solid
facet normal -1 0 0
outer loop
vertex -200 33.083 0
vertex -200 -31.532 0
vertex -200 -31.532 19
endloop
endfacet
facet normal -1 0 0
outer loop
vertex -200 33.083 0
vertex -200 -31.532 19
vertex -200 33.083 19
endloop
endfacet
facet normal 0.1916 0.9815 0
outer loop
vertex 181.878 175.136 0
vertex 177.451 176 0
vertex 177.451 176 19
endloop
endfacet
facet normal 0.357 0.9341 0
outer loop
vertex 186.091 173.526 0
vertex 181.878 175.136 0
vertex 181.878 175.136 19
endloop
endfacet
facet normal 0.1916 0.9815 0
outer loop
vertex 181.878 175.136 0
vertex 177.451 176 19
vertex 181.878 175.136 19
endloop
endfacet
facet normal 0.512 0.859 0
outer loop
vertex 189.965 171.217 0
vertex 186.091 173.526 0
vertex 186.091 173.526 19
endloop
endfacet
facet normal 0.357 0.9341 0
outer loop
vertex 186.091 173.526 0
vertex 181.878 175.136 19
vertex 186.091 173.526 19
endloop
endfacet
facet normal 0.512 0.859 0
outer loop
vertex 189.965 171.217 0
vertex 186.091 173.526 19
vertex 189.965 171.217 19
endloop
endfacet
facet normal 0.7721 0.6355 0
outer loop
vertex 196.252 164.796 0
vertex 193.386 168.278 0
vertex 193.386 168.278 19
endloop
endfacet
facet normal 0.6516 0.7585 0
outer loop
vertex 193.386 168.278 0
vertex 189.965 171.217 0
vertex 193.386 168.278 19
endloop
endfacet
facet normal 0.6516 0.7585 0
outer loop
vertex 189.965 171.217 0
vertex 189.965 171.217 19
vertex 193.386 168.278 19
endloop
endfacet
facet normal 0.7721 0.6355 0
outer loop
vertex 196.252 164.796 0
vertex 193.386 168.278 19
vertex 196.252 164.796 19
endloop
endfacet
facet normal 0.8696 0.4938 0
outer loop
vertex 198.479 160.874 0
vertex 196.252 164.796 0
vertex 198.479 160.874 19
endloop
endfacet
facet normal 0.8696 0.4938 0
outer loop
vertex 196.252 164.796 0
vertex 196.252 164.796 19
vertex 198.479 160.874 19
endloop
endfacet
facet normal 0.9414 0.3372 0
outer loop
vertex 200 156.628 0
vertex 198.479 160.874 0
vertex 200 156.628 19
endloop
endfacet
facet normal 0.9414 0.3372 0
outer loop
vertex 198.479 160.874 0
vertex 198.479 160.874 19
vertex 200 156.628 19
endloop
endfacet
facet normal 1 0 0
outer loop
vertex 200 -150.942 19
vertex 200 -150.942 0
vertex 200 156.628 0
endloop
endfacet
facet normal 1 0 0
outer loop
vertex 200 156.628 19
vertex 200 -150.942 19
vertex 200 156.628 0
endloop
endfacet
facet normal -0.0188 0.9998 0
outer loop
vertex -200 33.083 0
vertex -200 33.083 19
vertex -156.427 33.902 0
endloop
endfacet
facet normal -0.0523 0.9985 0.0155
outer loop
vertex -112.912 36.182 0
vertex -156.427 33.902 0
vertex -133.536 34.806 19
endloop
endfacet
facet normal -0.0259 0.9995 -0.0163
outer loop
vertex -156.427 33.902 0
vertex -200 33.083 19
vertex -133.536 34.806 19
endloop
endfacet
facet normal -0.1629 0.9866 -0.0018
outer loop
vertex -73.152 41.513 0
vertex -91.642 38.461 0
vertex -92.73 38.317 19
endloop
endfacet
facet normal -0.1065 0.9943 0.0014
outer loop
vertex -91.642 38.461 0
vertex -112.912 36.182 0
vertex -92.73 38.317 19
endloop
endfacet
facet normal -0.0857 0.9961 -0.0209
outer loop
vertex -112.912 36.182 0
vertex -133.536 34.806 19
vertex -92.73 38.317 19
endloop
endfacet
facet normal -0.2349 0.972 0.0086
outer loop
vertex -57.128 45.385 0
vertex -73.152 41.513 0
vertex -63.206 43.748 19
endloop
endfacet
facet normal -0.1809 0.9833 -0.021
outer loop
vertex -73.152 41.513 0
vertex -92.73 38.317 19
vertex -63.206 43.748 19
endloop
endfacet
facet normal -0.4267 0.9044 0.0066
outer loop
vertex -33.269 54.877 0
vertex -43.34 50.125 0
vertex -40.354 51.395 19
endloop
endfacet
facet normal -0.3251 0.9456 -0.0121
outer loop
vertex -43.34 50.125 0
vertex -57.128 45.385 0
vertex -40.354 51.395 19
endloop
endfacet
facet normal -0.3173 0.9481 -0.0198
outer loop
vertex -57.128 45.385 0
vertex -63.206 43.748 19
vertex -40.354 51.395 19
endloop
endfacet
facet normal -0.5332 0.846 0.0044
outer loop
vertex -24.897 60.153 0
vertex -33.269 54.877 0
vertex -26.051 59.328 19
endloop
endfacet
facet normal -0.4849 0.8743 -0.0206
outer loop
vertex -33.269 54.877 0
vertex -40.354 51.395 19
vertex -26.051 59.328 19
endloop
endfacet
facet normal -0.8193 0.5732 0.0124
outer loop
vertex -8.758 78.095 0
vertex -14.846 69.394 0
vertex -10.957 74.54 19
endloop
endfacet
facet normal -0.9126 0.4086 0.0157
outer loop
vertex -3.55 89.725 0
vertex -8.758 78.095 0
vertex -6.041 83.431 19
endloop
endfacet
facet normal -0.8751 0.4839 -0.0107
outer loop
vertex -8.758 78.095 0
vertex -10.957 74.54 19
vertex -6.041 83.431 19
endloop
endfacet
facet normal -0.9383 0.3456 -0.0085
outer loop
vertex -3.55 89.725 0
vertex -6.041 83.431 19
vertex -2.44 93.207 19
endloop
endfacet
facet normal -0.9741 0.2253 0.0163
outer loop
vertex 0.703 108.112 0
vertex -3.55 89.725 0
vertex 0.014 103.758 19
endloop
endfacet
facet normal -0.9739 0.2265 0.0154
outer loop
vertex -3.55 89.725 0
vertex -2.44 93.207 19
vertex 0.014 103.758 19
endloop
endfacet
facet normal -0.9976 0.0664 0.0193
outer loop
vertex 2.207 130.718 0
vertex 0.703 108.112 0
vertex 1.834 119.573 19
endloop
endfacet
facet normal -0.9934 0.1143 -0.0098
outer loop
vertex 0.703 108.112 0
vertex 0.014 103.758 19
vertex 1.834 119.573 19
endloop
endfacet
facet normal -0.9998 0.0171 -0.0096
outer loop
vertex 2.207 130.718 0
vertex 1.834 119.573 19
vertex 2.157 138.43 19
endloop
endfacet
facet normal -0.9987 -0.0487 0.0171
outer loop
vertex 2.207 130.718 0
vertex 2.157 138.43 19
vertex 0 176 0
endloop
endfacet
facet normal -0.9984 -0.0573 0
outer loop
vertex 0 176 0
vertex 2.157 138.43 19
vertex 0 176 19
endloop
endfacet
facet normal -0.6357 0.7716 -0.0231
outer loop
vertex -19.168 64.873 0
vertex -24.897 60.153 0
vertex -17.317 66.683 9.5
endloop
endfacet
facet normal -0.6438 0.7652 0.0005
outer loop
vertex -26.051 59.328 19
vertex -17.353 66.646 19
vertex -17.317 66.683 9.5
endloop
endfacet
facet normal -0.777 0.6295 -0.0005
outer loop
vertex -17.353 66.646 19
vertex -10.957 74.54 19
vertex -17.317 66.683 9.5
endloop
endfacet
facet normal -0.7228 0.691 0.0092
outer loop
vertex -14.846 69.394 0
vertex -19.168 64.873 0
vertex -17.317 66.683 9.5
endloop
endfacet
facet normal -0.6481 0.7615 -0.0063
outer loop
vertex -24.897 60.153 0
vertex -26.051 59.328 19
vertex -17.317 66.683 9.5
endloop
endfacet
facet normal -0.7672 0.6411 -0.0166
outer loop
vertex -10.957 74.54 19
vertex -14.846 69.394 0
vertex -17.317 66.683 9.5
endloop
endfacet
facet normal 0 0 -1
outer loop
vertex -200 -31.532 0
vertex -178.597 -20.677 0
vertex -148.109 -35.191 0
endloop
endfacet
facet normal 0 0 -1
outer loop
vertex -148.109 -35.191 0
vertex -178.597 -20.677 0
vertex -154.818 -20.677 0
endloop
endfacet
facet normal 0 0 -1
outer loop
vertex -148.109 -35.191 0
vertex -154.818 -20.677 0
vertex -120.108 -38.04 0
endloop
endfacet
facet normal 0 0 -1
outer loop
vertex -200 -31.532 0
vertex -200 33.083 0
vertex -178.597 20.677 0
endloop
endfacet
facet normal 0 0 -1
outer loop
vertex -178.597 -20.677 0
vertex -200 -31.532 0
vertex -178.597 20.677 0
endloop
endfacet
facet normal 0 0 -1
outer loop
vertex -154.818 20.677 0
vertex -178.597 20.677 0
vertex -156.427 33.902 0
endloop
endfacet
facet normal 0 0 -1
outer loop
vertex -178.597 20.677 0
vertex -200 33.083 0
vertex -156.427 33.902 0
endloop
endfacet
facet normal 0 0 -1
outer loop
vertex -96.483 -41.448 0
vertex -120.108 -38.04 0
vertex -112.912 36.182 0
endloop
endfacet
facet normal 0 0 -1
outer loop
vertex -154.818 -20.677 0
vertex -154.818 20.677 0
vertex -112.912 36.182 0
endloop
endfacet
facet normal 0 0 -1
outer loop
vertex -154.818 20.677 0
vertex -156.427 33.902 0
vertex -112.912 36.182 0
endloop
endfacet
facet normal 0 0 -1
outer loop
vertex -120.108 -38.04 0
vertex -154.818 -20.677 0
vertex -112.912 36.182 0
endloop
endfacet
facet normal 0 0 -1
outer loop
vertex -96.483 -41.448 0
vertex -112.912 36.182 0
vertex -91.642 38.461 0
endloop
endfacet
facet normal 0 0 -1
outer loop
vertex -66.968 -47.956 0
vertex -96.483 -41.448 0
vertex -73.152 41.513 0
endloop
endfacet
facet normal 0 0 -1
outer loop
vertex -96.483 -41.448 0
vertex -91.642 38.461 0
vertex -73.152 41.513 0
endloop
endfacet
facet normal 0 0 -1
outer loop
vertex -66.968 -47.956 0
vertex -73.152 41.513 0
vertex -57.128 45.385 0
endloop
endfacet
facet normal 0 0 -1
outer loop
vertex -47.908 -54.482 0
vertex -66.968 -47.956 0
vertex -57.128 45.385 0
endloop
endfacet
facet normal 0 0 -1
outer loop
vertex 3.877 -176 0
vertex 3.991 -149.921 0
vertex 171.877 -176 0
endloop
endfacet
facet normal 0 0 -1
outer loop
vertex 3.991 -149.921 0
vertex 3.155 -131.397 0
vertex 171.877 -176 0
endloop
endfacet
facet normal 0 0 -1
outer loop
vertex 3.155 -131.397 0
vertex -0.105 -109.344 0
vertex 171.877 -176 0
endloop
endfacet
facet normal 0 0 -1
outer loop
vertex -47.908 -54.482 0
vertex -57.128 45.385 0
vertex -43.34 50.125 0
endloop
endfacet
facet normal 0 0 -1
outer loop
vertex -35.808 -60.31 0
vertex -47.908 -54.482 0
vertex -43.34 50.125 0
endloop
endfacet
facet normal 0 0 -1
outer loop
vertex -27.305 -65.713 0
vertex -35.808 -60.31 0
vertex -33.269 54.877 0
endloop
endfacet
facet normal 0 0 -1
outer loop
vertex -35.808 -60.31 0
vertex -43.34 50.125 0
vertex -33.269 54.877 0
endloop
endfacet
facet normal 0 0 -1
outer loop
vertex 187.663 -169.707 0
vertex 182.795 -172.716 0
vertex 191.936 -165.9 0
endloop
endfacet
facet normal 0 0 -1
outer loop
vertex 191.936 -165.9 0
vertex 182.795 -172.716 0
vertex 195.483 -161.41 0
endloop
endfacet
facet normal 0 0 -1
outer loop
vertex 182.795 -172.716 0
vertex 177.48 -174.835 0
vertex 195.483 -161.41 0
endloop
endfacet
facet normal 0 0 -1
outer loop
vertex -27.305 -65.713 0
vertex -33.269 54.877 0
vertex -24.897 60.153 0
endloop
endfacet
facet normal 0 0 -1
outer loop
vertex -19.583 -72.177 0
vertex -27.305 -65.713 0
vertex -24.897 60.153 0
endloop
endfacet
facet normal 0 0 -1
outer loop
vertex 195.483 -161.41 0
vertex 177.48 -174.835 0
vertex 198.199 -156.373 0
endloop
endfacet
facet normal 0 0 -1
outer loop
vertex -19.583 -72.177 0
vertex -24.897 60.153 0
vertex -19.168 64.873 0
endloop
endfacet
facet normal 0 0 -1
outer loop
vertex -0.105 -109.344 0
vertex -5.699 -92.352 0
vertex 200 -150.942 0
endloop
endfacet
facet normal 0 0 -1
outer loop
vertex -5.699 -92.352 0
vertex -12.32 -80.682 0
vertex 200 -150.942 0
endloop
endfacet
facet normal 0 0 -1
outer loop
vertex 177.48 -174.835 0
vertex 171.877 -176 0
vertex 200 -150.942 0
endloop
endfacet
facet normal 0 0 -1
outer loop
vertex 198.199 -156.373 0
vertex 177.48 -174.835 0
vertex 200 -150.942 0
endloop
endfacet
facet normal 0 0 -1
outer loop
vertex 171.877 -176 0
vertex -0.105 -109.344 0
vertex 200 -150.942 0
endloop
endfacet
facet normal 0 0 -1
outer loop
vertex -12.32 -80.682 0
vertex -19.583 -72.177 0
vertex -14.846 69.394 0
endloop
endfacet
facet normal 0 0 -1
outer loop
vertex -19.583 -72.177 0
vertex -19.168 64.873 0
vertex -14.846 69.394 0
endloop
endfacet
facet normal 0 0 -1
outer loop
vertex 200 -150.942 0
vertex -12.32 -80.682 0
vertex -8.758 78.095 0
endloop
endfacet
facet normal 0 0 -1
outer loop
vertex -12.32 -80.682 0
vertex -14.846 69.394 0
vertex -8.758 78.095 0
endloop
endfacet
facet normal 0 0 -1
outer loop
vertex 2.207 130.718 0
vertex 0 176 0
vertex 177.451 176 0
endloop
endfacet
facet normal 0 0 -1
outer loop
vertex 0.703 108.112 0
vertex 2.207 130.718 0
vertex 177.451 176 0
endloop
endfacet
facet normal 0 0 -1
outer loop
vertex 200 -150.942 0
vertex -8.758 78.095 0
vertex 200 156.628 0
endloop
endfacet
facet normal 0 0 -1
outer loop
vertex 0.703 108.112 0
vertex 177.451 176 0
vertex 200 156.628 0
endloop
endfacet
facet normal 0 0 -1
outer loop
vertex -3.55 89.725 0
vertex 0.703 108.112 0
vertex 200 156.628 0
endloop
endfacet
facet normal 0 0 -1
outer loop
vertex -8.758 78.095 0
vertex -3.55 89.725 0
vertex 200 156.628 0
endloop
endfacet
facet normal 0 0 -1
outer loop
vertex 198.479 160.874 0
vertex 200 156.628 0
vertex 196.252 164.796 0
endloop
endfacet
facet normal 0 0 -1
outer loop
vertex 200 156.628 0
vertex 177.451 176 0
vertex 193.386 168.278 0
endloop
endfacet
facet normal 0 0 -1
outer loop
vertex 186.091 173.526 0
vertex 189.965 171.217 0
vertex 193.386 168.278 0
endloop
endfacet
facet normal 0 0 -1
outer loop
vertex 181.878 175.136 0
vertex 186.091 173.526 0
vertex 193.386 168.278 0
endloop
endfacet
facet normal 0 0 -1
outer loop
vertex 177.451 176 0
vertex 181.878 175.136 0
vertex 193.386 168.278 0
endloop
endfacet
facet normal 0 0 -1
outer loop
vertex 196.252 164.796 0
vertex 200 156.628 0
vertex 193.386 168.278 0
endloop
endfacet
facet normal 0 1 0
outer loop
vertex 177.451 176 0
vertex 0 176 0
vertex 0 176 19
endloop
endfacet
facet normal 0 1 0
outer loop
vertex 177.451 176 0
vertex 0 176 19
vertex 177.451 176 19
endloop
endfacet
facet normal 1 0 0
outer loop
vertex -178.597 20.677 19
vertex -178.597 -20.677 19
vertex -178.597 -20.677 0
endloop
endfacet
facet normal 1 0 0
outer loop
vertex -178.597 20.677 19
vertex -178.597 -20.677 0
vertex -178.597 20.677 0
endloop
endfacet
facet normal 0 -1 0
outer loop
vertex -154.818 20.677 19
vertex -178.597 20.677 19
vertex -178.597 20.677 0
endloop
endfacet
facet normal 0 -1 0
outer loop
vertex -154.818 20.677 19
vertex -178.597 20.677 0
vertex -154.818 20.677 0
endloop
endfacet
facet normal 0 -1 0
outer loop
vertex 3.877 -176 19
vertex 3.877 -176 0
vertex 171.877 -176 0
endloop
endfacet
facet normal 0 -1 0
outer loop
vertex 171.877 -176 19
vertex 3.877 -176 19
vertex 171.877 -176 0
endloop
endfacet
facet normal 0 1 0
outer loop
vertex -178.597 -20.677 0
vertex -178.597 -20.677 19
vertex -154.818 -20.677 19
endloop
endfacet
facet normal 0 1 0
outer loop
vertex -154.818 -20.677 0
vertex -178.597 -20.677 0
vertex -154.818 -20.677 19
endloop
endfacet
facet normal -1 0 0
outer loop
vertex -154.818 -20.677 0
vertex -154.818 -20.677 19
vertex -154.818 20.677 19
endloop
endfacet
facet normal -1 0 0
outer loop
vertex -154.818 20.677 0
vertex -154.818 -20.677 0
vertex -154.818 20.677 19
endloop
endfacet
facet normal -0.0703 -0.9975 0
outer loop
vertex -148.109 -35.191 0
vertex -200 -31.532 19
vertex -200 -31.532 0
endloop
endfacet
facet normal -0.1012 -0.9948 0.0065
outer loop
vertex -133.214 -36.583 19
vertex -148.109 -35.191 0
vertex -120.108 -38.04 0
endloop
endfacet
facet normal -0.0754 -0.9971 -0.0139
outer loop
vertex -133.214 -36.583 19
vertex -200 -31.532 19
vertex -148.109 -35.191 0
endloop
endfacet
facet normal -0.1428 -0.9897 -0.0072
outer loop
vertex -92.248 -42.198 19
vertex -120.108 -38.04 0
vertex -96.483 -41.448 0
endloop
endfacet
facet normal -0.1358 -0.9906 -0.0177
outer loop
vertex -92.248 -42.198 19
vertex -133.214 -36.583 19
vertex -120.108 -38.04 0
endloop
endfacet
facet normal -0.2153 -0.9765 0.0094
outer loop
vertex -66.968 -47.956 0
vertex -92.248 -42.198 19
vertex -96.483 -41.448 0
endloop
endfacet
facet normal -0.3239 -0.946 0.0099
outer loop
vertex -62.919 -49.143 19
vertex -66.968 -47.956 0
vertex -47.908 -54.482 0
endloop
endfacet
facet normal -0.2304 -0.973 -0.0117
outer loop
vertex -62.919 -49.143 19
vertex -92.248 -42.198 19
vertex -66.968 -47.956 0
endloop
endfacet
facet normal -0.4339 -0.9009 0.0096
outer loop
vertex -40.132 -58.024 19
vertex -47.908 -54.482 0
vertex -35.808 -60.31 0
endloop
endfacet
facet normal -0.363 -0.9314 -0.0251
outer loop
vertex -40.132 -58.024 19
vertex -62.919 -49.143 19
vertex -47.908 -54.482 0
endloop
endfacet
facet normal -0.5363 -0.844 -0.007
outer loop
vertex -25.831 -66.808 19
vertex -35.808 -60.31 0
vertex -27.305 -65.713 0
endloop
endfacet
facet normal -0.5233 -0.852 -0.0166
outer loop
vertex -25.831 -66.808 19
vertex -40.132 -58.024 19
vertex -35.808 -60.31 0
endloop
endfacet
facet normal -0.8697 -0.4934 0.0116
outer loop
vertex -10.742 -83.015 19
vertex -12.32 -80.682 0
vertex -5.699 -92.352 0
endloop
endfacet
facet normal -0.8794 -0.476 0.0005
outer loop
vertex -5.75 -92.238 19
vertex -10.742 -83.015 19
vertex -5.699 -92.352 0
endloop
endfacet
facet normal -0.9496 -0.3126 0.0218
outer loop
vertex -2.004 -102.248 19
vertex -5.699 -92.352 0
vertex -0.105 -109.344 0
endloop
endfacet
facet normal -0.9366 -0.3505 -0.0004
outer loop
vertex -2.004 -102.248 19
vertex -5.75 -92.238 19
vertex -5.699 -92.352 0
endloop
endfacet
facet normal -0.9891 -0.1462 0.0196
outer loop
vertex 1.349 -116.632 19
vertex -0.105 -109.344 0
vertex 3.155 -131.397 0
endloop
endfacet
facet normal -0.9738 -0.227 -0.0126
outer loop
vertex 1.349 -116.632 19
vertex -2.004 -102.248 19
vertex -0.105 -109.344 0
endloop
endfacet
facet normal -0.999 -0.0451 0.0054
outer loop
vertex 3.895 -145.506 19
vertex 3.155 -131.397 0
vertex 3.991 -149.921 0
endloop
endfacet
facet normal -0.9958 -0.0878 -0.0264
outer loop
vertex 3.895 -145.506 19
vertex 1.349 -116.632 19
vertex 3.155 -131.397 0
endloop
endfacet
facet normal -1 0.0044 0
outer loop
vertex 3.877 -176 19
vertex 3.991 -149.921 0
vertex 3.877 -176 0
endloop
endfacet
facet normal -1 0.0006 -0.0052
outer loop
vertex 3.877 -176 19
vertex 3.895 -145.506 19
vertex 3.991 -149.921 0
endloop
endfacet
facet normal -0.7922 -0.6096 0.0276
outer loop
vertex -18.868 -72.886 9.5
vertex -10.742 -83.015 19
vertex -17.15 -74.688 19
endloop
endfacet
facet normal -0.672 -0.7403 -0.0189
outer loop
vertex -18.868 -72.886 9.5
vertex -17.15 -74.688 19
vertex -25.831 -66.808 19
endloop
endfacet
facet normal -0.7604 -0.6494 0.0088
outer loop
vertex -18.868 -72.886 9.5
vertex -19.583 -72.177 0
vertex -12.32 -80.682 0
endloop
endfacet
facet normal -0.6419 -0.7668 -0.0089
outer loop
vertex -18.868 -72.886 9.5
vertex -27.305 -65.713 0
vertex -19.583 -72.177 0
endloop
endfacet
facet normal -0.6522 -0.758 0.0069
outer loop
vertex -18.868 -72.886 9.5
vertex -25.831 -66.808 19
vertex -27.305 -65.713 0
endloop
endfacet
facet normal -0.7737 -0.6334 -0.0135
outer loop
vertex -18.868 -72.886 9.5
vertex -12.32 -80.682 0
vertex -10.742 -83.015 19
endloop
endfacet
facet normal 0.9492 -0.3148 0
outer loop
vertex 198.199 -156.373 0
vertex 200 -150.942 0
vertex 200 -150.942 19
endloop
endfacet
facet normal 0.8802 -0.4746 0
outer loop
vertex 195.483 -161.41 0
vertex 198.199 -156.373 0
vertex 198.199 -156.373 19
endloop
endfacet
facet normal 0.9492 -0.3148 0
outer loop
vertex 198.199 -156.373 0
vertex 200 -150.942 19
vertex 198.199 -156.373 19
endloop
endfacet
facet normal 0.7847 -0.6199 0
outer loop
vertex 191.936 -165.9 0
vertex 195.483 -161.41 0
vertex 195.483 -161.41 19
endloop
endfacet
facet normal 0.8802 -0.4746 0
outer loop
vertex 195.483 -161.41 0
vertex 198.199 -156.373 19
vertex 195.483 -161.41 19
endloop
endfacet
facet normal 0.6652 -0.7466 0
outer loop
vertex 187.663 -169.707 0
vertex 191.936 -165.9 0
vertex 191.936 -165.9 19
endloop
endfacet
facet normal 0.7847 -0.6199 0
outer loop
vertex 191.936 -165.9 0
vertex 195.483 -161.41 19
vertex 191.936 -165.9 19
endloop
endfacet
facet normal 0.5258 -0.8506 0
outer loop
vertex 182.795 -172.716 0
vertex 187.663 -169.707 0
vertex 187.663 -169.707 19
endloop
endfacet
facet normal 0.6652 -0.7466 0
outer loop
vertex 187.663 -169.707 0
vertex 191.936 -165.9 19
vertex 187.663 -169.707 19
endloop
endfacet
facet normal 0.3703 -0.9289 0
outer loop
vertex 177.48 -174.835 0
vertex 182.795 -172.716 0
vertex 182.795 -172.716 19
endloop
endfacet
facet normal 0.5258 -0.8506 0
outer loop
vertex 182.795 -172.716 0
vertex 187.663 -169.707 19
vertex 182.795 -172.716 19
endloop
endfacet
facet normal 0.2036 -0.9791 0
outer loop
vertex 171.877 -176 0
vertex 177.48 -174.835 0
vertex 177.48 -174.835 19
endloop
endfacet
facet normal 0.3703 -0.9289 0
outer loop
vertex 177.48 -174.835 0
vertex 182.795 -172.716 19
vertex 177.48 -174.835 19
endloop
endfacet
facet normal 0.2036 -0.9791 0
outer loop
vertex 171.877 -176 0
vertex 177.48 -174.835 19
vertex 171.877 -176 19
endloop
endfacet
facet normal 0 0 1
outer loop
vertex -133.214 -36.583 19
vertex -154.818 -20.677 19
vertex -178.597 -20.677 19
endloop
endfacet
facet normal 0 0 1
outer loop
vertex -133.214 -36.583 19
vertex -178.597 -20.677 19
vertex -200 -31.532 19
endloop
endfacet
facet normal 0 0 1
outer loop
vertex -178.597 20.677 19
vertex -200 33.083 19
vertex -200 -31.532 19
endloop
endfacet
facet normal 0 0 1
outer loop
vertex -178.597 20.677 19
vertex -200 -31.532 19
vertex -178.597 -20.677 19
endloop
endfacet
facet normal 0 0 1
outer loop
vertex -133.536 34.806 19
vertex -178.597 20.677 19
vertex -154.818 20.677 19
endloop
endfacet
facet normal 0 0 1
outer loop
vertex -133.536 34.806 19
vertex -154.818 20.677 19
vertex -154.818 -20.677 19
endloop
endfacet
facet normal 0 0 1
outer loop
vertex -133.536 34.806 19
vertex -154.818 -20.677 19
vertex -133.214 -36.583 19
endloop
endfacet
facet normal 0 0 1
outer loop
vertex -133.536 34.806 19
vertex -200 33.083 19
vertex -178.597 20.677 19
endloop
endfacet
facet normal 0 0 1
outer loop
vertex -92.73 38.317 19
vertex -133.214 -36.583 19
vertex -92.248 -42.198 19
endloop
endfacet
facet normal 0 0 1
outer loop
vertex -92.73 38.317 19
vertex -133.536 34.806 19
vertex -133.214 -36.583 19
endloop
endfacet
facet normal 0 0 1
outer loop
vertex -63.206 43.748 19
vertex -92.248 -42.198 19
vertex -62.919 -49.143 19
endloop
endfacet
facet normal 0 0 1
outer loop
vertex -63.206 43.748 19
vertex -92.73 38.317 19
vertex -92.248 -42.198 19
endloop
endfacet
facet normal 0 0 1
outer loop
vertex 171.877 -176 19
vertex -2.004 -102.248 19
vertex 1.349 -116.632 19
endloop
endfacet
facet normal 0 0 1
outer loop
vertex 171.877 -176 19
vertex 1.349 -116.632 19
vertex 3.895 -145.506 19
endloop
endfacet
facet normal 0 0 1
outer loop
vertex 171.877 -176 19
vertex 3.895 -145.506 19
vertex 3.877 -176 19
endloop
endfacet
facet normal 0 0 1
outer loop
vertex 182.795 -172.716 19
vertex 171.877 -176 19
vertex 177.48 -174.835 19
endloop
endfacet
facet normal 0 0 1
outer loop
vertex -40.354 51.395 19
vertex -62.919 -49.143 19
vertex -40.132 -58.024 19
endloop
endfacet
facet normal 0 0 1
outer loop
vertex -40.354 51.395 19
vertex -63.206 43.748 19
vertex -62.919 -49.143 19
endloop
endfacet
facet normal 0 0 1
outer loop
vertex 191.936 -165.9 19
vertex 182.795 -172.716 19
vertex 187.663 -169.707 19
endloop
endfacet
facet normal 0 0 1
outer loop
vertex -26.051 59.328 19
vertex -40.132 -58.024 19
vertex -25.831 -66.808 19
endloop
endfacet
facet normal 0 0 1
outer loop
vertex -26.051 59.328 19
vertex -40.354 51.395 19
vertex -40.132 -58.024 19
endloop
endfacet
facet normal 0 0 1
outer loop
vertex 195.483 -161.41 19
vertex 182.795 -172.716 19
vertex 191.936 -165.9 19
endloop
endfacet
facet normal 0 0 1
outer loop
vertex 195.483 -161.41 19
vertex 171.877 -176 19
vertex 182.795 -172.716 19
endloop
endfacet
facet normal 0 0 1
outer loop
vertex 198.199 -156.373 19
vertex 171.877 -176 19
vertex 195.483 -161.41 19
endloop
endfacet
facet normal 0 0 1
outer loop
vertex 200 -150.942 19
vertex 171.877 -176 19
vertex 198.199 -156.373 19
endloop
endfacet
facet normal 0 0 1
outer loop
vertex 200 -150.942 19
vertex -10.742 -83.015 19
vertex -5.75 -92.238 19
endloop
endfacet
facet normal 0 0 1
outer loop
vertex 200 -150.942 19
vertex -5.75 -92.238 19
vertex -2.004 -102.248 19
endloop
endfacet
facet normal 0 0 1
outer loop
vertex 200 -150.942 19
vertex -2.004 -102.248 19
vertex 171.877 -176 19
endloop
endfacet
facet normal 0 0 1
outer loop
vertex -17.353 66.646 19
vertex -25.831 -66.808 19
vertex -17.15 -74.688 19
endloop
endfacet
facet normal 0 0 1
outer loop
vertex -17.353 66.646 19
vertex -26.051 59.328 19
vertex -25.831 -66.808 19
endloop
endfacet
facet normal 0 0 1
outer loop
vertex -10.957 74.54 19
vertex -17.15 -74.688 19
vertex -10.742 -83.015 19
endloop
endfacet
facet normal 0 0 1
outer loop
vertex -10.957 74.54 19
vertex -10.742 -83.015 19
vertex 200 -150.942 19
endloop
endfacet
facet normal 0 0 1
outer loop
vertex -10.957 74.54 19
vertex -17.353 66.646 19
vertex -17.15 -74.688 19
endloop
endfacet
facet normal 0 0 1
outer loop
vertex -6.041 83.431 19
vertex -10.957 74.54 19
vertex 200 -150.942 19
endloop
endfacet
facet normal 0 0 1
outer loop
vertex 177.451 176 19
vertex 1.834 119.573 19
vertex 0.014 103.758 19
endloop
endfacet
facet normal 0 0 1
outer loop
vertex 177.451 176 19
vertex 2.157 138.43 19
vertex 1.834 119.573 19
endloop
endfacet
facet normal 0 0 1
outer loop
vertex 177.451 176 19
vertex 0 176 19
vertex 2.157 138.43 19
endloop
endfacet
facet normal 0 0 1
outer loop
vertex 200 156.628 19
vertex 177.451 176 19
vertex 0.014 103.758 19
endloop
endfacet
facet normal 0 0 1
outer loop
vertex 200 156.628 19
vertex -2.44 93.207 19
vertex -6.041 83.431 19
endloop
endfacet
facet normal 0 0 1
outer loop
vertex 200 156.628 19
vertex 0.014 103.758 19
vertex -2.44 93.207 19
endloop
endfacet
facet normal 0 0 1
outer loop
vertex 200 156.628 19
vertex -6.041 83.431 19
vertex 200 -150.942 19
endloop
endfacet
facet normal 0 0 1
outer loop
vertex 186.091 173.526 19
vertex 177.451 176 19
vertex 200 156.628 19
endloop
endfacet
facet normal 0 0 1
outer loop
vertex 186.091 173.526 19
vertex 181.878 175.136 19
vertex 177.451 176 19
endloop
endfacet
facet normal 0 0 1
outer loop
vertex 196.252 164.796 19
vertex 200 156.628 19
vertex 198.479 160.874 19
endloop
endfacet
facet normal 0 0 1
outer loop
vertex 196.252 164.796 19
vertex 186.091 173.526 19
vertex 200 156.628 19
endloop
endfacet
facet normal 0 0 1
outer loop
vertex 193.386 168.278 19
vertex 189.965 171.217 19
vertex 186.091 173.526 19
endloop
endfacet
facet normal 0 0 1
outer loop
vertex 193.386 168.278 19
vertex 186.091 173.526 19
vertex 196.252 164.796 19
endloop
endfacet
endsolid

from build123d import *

# Parameters (mm, degrees)
F0_W     = 400
F0_H     = 352
F1_DEPTH = 19
F3_DEPTH = 19.001
F5_DEPTH = 19.0010001
F6_W     = 23.7784683704
F6_H     = 41.3538441062
F7_DEPTH = 19.0010001


with BuildPart() as f1:
    # F0 (on Top) → F1 (new body)
    with BuildSketch(Plane.XY):
        Rectangle(F0_W, F0_H)
    extrude(amount=F1_DEPTH)

    # F2 (on face) → F3 (cut, through all)
    with BuildSketch(Plane.XY.offset(19)):
        with BuildLine():
            add(Edge.make_bspline(
                [(-200, -31.5323062241), (-125.2770154333, -36.2490441097), (5.7780898117, -44.5216336427), (4.4484516613, -136.4751329034), (3.8769261446, -176)],
                knots=[0, 0, 0, 0, 0.5701646222, 1, 1, 1, 1], degree=3))
            Line((-200, -31.5323062241), (-200, -176))
            Line((-200, -176), (3.8769261446, -176))
        make_face()
        with BuildLine():
            Line((-200, 176), (-200, 33.0830775201))
            add(Edge.make_bspline(
                [(-200, 33.0830775201), (-124.0325945429, 34.1230566676), (10.5757099688, 35.9658184275), (3.2091678996, 133.5070419218), (0, 176)],
                knots=[0, 0, 0, 0, 0.5643589802, 1, 1, 1, 1], degree=3))
            Line((0, 176), (-200, 176))
        make_face()
        with BuildLine():
            ThreePointArc((200, -150.9415358305), (189.8823225958, -167.8969578857), (171.8769222498, -176))
            Line((171.8769222498, -176), (200, -176))
            Line((200, -176), (200, -150.9415358305))
        make_face()
    extrude(amount=-F3_DEPTH, mode=Mode.SUBTRACT)

    # F4 (on face) → F5 (cut, through all)
    with BuildSketch(Plane.XY.offset(19)):
        with BuildLine():
            ThreePointArc((177.4510932605, 176), (191.7387998266, 169.8211963235), (200, 156.6276848316))
            Line((200, 156.6276848316), (200, 176))
            Line((200, 176), (177.4510932605, 176))
        make_face()
    extrude(amount=-F5_DEPTH, mode=Mode.SUBTRACT)

    # F6 (on face) → F7 (cut, through all)
    with BuildSketch(Plane.XY.offset(19)):
        with Locations((-166.7076945305, 0)):
            Rectangle(F6_W, F6_H)
    extrude(amount=-F7_DEPTH, mode=Mode.SUBTRACT)


solid = f1.part
